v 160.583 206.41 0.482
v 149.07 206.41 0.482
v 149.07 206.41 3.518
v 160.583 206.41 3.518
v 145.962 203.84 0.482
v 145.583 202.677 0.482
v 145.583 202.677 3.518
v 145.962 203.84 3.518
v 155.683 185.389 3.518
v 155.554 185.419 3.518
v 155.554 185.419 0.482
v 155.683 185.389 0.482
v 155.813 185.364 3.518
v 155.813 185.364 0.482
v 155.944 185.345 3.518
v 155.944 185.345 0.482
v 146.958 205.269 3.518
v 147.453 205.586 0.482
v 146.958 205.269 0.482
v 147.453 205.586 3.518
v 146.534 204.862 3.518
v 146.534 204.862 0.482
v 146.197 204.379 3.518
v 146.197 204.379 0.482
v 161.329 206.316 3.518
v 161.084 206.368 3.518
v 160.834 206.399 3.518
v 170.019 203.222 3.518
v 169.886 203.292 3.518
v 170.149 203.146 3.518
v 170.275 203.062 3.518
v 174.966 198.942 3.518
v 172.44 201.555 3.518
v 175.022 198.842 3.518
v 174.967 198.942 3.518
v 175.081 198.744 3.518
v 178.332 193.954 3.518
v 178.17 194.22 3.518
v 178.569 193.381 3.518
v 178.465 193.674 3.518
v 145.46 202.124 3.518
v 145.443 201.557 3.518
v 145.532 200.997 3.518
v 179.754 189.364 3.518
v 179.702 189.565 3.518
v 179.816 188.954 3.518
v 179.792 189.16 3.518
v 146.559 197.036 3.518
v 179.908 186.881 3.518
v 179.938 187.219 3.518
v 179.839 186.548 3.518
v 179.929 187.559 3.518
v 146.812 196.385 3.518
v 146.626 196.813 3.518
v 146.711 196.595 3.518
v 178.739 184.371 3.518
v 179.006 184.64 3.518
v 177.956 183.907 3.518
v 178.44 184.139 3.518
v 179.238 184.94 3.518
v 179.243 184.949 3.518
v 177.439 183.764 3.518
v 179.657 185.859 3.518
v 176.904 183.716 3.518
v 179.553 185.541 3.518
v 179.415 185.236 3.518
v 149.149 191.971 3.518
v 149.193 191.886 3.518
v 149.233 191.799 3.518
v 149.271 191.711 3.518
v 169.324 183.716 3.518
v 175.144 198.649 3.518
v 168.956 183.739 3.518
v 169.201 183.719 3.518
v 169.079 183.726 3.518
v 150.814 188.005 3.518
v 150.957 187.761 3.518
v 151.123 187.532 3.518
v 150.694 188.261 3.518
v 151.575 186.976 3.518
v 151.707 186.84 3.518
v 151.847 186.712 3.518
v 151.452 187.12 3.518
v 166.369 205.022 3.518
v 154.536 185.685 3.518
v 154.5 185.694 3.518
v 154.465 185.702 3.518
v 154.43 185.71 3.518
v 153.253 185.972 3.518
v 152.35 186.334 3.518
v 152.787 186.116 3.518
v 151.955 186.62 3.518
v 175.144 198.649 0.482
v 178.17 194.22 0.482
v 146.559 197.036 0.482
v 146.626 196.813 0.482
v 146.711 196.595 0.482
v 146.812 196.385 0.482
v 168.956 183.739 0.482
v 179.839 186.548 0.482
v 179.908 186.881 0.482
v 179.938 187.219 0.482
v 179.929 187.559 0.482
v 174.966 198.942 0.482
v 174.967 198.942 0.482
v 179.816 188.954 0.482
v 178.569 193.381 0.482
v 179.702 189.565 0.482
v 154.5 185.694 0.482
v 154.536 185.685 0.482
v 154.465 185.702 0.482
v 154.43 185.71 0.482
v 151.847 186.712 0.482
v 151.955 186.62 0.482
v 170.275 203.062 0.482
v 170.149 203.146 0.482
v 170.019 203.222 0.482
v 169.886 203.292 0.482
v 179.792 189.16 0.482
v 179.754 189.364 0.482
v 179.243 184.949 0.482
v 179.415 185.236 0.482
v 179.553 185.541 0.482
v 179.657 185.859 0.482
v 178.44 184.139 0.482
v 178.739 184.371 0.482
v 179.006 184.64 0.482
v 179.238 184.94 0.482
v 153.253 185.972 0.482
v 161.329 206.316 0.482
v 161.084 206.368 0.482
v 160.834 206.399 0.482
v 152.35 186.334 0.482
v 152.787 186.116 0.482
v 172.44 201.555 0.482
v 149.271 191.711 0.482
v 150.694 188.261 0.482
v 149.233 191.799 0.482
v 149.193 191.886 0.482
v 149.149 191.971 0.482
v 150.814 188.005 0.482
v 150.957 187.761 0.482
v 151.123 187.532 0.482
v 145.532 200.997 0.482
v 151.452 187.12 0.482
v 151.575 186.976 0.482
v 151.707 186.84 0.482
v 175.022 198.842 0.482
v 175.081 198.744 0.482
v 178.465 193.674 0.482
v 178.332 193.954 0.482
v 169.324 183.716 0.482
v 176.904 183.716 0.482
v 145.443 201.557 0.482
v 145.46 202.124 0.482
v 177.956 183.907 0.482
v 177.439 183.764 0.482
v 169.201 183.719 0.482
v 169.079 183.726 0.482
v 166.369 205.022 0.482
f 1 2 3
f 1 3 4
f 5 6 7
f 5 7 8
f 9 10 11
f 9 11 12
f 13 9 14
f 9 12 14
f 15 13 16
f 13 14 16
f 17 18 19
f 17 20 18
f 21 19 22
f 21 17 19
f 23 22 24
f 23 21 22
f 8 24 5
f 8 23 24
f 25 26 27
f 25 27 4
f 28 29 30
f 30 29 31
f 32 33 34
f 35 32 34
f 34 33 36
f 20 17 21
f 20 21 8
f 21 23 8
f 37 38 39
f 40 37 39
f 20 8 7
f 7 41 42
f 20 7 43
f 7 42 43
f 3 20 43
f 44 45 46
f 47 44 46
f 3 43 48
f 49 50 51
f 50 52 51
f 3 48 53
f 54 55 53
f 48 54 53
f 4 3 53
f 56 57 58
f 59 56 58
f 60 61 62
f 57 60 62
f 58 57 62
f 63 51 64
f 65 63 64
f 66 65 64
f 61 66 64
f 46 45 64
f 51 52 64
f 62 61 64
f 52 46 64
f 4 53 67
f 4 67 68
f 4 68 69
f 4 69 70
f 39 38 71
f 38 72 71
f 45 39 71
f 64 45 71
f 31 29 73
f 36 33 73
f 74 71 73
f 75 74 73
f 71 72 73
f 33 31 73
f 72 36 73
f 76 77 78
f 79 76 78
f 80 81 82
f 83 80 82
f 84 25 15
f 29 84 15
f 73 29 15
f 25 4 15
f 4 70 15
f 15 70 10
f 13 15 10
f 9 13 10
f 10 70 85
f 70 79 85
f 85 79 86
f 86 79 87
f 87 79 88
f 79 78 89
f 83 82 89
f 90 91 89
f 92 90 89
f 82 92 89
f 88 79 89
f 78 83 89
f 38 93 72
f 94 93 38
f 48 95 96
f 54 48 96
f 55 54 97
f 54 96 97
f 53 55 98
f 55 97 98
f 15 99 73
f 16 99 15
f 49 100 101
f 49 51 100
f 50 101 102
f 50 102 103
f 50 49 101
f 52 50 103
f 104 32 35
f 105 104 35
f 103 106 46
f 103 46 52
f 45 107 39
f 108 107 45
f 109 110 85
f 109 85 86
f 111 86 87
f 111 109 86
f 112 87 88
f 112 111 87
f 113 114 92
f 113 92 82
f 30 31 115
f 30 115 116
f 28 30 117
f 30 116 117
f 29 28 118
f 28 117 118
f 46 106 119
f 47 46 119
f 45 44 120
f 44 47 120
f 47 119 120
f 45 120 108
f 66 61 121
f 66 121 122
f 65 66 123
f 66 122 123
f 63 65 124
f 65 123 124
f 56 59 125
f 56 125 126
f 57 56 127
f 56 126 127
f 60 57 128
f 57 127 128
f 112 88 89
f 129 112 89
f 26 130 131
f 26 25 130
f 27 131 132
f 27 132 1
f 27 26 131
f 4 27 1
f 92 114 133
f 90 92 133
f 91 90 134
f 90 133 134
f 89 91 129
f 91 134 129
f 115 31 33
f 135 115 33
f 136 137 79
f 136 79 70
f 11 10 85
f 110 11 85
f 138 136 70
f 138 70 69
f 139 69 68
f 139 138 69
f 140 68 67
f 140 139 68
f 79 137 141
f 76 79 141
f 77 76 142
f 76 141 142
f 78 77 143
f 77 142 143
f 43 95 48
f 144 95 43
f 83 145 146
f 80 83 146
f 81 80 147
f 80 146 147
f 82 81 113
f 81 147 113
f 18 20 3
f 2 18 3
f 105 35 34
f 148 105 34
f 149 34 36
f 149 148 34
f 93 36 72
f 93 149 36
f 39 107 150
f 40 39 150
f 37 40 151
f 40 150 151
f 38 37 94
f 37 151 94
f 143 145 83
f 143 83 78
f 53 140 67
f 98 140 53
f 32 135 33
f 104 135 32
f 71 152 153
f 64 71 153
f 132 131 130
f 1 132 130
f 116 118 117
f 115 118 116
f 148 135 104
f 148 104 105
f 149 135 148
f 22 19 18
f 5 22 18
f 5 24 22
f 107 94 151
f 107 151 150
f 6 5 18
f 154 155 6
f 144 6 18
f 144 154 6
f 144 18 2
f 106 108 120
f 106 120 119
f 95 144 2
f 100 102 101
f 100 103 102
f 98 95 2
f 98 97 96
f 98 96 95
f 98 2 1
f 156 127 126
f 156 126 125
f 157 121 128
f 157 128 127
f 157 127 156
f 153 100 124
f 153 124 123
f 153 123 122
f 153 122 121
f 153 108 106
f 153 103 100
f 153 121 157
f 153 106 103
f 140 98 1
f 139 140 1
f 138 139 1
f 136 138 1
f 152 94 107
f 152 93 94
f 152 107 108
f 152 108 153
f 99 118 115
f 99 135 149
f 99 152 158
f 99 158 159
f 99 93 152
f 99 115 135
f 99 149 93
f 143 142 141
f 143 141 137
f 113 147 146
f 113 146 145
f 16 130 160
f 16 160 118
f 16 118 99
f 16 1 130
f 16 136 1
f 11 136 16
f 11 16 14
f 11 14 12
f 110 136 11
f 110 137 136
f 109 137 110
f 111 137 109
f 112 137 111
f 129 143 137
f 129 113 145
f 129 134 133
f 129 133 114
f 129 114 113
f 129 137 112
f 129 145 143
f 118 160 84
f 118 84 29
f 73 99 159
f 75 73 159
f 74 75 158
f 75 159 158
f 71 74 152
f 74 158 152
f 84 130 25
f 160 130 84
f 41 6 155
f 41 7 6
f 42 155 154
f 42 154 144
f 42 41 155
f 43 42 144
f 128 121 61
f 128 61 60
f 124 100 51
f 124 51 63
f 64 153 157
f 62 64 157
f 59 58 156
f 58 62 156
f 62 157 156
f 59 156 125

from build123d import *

# Parameters (mm, degrees)
BOSS_EXTRUDE1_DEPTH = 4
SCALE4_SCALE        = 0.75919
FILLET6_R           = 3
FILLET7_R           = 3


with BuildPart() as part:
    # Sketch1 → Boss-Extrude1 (new body)
    with BuildSketch(Plane.XY):
        Polygon((139.887521377, 204.056894723), (141.24778548, 208.242322731), (144.835713473, 210.070135105), (160.500754315, 210.070135105), (167.622266071, 208.242322731), (172.522669487, 205.831679823), (175.619724447, 203.675502319), (178.946764591, 200.233807794), (179.037084843, 200.056512483), (183.5160481, 193.501931379), (185.301557704, 187.487393826), (185.539112291, 184.563645059), (184.954362538, 182.355057305), (184.113784767, 181.109966828), (182.651910383, 180.178021908), (181.232301611, 180.178021908), (171.271612606, 180.178021908), (153.63070922, 182.355057305), (151.966131288, 182.789295026), (149.384829279, 183.363134026), (148.208709289, 184.36807152), (147.189516356, 185.643755739), (145.029311699, 190.88387399), (141.644867129, 197.274737006), align=None)
    extrude(amount=BOSS_EXTRUDE1_DEPTH)


with BuildPart() as part_1:
    # Scale4: scaled about (162.417336375, 194.870616826, 2)
    add(part.part.scale(SCALE4_SCALE).moved(Location((39.111718772, 46.926793238, 0.48162))))

    # Fillet6
    # the kernel refuses this fillet: 3 mm, written as the material it adds along each edge
    with BuildSketch(Plane(origin=(175.034883215, 198.80769695, 0.48162), x_dir=(0.5641904622979087, -0.8256446706980383, 0), z_dir=(0, 0, 1))) as fillet6_piece_1_section:
        with BuildLine():
            CenterArc((FILLET6_R * 0.0642311981219, FILLET6_R), FILLET6_R, 262.649743959, 7.350256041)
            Line((-FILLET6_R * 0.063703385216, FILLET6_R * 0.00821739156901), (0, 0))
            Line((0, 0), (FILLET6_R * 0.0642311981219, 0))
        make_face()
    fillet6_piece_1 = extrude(amount=3.03676, mode=Mode.PRIVATE)
    fillet6_piece_1 = split(fillet6_piece_1, bisect_by=Plane(origin=(175.064317261, 198.840916135, 2), z_dir=(-0.7189811970622167, -0.6950295233088893, 0)), keep=Keep.TOP, mode=Mode.PRIVATE)
    add(fillet6_piece_1)
    with BuildSketch(Plane(origin=(154.482885985, 185.698598128, 0.48162), x_dir=(-0.9761697325769959, 0.21700841734954968, 0), z_dir=(0, 0, 1))) as fillet6_piece_2:
        with BuildLine():
            CenterArc((FILLET6_R * 0.0182188067452, FILLET6_R), FILLET6_R, 267.912509474, 2.087490526)
            Line((-FILLET6_R * 0.0182067162065, FILLET6_R * 0.000663629563253), (0, 0))
            Line((0, 0), (FILLET6_R * 0.0182188067452, 0))
        make_face()
    extrude(amount=3.03676)
    with BuildSketch(Plane(origin=(149.216521921, 191.843921532, 0.48162), x_dir=(-0.4680007470830183, 0.8837280694476876, 0), z_dir=(0, 0, 1))) as fillet6_piece_3:
        with BuildLine():
            CenterArc((FILLET6_R * 0.0480422965927, FILLET6_R), FILLET6_R, 264.498987959, 5.501012041)
            Line((-FILLET6_R * 0.0478210380477, FILLET6_R * 0.00460549475516), (0, 0))
            Line((0, 0), (FILLET6_R * 0.0480422965927, 0))
        make_face()
    extrude(amount=3.03676)
    # the kernel refuses this fillet: 3 mm, written as the material it takes off along each edge
    with BuildSketch(Plane(origin=(170.089204221, 203.192146242, -0.085723646), x_dir=(0.8206934047378623, -0.5713688260832711, 0), z_dir=(0, 0, 1))) as fillet6_2_piece_1:
        with BuildLine():
            CenterArc((FILLET6_R * 0.0756458194575, -FILLET6_R), FILLET6_R, 90, 8.651894609)
            Line((-FILLET6_R * 0.0747850106227, -FILLET6_R * 0.0113794634131), (0, 0))
            Line((0, 0), (FILLET6_R * 0.0756458194575, 0))
        make_face()
    extrude(amount=4.171447292, mode=Mode.SUBTRACT)
    with BuildSketch(Plane(origin=(179.790808366, 189.265347757, -0.299334996), x_dir=(0.08098313210757263, -0.9967154720952452, 0), z_dir=(0, 0, 1))) as fillet6_2_piece_2:
        with BuildLine():
            CenterArc((FILLET6_R * 0.104127332747, -FILLET6_R), FILLET6_R, 90, 11.889267137)
            Line((-FILLET6_R * 0.101893551021, -FILLET6_R * 0.0214524051169), (0, 0))
            Line((0, 0), (FILLET6_R * 0.104127332747, 0))
        make_face()
    extrude(amount=4.598669991, mode=Mode.SUBTRACT)
    with BuildSketch(Plane(origin=(179.527221267, 185.368929193, -0.786529904), x_dir=(-0.5595376521790817, -0.8288049322934323, 0), z_dir=(0, 0, 1))) as fillet6_2_piece_3:
        with BuildLine():
            CenterArc((FILLET6_R * 0.169086653883, -FILLET6_R), FILLET6_R, 90, 19.194353316)
            Line((-FILLET6_R * 0.159686919919, -FILLET6_R * 0.0555912234793), (0, 0))
            Line((0, 0), (FILLET6_R * 0.169086653883, 0))
        make_face()
    extrude(amount=5.573059808, mode=Mode.SUBTRACT)
    with BuildSketch(Plane(origin=(178.435267329, 193.831524522, -0.693636489), x_dir=(0.2845900515763164, -0.9586493115544337, 0), z_dir=(0, 0, 1))) as fillet6_2_piece_4:
        with BuildLine():
            CenterArc((FILLET6_R * 0.156700865162, -FILLET6_R), FILLET6_R, 90, 17.811748872)
            Line((-FILLET6_R * 0.149189673688, -FILLET6_R * 0.0479333120825), (0, 0))
            Line((0, 0), (FILLET6_R * 0.156700865162, 0))
        make_face()
    extrude(amount=5.387272977, mode=Mode.SUBTRACT)
    with BuildSketch(Plane(origin=(178.88906303, 184.423668954, -1.075559702), x_dir=(-0.8432271980573246, -0.5375573387615439, 0), z_dir=(0, 0, 1))) as fillet6_2_piece_5:
        with BuildLine():
            CenterArc((FILLET6_R * 0.207623960269, -FILLET6_R), FILLET6_R, 90, 23.458660046)
            Line((-FILLET6_R * 0.190463329283, -FILLET6_R * 0.0826524595894), (0, 0))
            Line((0, 0), (FILLET6_R * 0.207623960269, 0))
        make_face()
    extrude(amount=6.151119404, mode=Mode.SUBTRACT)
    with BuildSketch(Plane(origin=(169.139414347, 183.71614569, 0.020587263), x_dir=(-0.9924710740045749, 0.12247925238261967, 0), z_dir=(0, 0, 1))) as fillet6_2_piece_6:
        with BuildLine():
            CenterArc((FILLET6_R * 0.0614710316153, -FILLET6_R), FILLET6_R, 90, 7.035208973)
            Line((-FILLET6_R * 0.0610082207674, -FILLET6_R * 0.00752892599542), (0, 0))
            Line((0, 0), (FILLET6_R * 0.0614710316153, 0))
        make_face()
    extrude(amount=3.958825474, mode=Mode.SUBTRACT)
    with BuildSketch(Plane(origin=(155.746616905, 185.368929193, -0.015587097), x_dir=(-0.9676172723968424, 0.2524218971470086, 0), z_dir=(0, 0, 1))) as fillet6_2_piece_7:
        with BuildLine():
            CenterArc((FILLET6_R * 0.0662942795425, -FILLET6_R), FILLET6_R, 90, 7.585665015)
            Line((-FILLET6_R * 0.0657141117056, -FILLET6_R * 0.00875140119136), (0, 0))
            Line((0, 0), (FILLET6_R * 0.0662942795425, 0))
        make_face()
    extrude(amount=4.031174193, mode=Mode.SUBTRACT)
    with BuildSketch(Plane(origin=(150.856527695, 187.865676157, -0.587064111), x_dir=(-0.3811282524443585, 0.9245221766884282, 0), z_dir=(0, 0, 1))) as fillet6_2_piece_8:
        with BuildLine():
            CenterArc((FILLET6_R * 0.14249121477, -FILLET6_R), FILLET6_R, 90, 16.21910898)
            Line((-FILLET6_R * 0.136820147731, -FILLET6_R * 0.0397994153417), (0, 0))
            Line((0, 0), (FILLET6_R * 0.14249121477, 0))
        make_face()
    extrude(amount=5.174128222, mode=Mode.SUBTRACT)
    with BuildSketch(Plane(origin=(151.630288778, 186.897189455, -0.231632642), x_dir=(-0.6241891196597051, 0.7812732831080572, 0), z_dir=(0, 0, 1))) as fillet6_2_piece_9:
        with BuildLine():
            CenterArc((FILLET6_R * 0.0951003522105, -FILLET6_R), FILLET6_R, 90, 10.865021551)
            Line((-FILLET6_R * 0.0933955804828, -FILLET6_R * 0.0179260295894), (0, 0))
            Line((0, 0), (FILLET6_R * 0.0951003522104, 0))
        make_face()
    extrude(amount=4.463265283, mode=Mode.SUBTRACT)
    with BuildSketch(Plane(origin=(152.523187313, 186.134250959, -1.386873198), x_dir=(-0.7602667232190712, 0.6496110448304708, 0), z_dir=(0, 0, 1))) as fillet6_2_piece_10:
        with BuildLine():
            CenterArc((FILLET6_R * 0.249132426376, -FILLET6_R), FILLET6_R, 90, 27.978899274)
            Line((-FILLET6_R * 0.220013935166, -FILLET6_R * 0.116879571377), (0, 0))
            Line((0, 0), (FILLET6_R * 0.249132426376, 0))
        make_face()
    extrude(amount=6.773746396, mode=Mode.SUBTRACT)
    with BuildSketch(Plane(origin=(177.779222616, 183.71614569, -1.705674136), x_dir=(-1, 0, 0), z_dir=(0, 0, 1))) as fillet6_2_piece_11:
        with BuildLine():
            CenterArc((FILLET6_R * 0.291639218067, -FILLET6_R), FILLET6_R, 90, 32.517510615)
            Line((-FILLET6_R * 0.245918120694, -FILLET6_R * 0.156772801943), (0, 0))
            Line((0, 0), (FILLET6_R * 0.291639218067, 0))
        make_face()
    extrude(amount=7.411348271, mode=Mode.SUBTRACT)
    with BuildSketch(Plane(origin=(146.647085448, 196.695800825, -0.397967253), x_dir=(0.4680007470830723, -0.8837280694476589, 0), z_dir=(0, 0, 1))) as fillet6_2_piece_12:
        with BuildLine():
            CenterArc((FILLET6_R * 0.117278300393, FILLET6_R), FILLET6_R, 256.622007888, 13.377992112)
            Line((-FILLET6_R * 0.114095932972, FILLET6_R * 0.027135176844), (0, 0))
            Line((0, 0), (FILLET6_R * 0.117278300394, 0))
        make_face()
    extrude(amount=4.795934506, mode=Mode.SUBTRACT)

    # Fillet7
    fillet7_edges = [part_1.edges().sort_by_distance(p)[0] for p in [
        (145.312926127, 201.844747143, 2),
        (146.345625031, 205.022282232, 2),
        (160.962286441, 206.409939108, 2),
        (179.971157433, 187.04566693, 2),
    ]]
    fillet(fillet7_edges, radius=FILLET7_R)


solid = part_1.part
